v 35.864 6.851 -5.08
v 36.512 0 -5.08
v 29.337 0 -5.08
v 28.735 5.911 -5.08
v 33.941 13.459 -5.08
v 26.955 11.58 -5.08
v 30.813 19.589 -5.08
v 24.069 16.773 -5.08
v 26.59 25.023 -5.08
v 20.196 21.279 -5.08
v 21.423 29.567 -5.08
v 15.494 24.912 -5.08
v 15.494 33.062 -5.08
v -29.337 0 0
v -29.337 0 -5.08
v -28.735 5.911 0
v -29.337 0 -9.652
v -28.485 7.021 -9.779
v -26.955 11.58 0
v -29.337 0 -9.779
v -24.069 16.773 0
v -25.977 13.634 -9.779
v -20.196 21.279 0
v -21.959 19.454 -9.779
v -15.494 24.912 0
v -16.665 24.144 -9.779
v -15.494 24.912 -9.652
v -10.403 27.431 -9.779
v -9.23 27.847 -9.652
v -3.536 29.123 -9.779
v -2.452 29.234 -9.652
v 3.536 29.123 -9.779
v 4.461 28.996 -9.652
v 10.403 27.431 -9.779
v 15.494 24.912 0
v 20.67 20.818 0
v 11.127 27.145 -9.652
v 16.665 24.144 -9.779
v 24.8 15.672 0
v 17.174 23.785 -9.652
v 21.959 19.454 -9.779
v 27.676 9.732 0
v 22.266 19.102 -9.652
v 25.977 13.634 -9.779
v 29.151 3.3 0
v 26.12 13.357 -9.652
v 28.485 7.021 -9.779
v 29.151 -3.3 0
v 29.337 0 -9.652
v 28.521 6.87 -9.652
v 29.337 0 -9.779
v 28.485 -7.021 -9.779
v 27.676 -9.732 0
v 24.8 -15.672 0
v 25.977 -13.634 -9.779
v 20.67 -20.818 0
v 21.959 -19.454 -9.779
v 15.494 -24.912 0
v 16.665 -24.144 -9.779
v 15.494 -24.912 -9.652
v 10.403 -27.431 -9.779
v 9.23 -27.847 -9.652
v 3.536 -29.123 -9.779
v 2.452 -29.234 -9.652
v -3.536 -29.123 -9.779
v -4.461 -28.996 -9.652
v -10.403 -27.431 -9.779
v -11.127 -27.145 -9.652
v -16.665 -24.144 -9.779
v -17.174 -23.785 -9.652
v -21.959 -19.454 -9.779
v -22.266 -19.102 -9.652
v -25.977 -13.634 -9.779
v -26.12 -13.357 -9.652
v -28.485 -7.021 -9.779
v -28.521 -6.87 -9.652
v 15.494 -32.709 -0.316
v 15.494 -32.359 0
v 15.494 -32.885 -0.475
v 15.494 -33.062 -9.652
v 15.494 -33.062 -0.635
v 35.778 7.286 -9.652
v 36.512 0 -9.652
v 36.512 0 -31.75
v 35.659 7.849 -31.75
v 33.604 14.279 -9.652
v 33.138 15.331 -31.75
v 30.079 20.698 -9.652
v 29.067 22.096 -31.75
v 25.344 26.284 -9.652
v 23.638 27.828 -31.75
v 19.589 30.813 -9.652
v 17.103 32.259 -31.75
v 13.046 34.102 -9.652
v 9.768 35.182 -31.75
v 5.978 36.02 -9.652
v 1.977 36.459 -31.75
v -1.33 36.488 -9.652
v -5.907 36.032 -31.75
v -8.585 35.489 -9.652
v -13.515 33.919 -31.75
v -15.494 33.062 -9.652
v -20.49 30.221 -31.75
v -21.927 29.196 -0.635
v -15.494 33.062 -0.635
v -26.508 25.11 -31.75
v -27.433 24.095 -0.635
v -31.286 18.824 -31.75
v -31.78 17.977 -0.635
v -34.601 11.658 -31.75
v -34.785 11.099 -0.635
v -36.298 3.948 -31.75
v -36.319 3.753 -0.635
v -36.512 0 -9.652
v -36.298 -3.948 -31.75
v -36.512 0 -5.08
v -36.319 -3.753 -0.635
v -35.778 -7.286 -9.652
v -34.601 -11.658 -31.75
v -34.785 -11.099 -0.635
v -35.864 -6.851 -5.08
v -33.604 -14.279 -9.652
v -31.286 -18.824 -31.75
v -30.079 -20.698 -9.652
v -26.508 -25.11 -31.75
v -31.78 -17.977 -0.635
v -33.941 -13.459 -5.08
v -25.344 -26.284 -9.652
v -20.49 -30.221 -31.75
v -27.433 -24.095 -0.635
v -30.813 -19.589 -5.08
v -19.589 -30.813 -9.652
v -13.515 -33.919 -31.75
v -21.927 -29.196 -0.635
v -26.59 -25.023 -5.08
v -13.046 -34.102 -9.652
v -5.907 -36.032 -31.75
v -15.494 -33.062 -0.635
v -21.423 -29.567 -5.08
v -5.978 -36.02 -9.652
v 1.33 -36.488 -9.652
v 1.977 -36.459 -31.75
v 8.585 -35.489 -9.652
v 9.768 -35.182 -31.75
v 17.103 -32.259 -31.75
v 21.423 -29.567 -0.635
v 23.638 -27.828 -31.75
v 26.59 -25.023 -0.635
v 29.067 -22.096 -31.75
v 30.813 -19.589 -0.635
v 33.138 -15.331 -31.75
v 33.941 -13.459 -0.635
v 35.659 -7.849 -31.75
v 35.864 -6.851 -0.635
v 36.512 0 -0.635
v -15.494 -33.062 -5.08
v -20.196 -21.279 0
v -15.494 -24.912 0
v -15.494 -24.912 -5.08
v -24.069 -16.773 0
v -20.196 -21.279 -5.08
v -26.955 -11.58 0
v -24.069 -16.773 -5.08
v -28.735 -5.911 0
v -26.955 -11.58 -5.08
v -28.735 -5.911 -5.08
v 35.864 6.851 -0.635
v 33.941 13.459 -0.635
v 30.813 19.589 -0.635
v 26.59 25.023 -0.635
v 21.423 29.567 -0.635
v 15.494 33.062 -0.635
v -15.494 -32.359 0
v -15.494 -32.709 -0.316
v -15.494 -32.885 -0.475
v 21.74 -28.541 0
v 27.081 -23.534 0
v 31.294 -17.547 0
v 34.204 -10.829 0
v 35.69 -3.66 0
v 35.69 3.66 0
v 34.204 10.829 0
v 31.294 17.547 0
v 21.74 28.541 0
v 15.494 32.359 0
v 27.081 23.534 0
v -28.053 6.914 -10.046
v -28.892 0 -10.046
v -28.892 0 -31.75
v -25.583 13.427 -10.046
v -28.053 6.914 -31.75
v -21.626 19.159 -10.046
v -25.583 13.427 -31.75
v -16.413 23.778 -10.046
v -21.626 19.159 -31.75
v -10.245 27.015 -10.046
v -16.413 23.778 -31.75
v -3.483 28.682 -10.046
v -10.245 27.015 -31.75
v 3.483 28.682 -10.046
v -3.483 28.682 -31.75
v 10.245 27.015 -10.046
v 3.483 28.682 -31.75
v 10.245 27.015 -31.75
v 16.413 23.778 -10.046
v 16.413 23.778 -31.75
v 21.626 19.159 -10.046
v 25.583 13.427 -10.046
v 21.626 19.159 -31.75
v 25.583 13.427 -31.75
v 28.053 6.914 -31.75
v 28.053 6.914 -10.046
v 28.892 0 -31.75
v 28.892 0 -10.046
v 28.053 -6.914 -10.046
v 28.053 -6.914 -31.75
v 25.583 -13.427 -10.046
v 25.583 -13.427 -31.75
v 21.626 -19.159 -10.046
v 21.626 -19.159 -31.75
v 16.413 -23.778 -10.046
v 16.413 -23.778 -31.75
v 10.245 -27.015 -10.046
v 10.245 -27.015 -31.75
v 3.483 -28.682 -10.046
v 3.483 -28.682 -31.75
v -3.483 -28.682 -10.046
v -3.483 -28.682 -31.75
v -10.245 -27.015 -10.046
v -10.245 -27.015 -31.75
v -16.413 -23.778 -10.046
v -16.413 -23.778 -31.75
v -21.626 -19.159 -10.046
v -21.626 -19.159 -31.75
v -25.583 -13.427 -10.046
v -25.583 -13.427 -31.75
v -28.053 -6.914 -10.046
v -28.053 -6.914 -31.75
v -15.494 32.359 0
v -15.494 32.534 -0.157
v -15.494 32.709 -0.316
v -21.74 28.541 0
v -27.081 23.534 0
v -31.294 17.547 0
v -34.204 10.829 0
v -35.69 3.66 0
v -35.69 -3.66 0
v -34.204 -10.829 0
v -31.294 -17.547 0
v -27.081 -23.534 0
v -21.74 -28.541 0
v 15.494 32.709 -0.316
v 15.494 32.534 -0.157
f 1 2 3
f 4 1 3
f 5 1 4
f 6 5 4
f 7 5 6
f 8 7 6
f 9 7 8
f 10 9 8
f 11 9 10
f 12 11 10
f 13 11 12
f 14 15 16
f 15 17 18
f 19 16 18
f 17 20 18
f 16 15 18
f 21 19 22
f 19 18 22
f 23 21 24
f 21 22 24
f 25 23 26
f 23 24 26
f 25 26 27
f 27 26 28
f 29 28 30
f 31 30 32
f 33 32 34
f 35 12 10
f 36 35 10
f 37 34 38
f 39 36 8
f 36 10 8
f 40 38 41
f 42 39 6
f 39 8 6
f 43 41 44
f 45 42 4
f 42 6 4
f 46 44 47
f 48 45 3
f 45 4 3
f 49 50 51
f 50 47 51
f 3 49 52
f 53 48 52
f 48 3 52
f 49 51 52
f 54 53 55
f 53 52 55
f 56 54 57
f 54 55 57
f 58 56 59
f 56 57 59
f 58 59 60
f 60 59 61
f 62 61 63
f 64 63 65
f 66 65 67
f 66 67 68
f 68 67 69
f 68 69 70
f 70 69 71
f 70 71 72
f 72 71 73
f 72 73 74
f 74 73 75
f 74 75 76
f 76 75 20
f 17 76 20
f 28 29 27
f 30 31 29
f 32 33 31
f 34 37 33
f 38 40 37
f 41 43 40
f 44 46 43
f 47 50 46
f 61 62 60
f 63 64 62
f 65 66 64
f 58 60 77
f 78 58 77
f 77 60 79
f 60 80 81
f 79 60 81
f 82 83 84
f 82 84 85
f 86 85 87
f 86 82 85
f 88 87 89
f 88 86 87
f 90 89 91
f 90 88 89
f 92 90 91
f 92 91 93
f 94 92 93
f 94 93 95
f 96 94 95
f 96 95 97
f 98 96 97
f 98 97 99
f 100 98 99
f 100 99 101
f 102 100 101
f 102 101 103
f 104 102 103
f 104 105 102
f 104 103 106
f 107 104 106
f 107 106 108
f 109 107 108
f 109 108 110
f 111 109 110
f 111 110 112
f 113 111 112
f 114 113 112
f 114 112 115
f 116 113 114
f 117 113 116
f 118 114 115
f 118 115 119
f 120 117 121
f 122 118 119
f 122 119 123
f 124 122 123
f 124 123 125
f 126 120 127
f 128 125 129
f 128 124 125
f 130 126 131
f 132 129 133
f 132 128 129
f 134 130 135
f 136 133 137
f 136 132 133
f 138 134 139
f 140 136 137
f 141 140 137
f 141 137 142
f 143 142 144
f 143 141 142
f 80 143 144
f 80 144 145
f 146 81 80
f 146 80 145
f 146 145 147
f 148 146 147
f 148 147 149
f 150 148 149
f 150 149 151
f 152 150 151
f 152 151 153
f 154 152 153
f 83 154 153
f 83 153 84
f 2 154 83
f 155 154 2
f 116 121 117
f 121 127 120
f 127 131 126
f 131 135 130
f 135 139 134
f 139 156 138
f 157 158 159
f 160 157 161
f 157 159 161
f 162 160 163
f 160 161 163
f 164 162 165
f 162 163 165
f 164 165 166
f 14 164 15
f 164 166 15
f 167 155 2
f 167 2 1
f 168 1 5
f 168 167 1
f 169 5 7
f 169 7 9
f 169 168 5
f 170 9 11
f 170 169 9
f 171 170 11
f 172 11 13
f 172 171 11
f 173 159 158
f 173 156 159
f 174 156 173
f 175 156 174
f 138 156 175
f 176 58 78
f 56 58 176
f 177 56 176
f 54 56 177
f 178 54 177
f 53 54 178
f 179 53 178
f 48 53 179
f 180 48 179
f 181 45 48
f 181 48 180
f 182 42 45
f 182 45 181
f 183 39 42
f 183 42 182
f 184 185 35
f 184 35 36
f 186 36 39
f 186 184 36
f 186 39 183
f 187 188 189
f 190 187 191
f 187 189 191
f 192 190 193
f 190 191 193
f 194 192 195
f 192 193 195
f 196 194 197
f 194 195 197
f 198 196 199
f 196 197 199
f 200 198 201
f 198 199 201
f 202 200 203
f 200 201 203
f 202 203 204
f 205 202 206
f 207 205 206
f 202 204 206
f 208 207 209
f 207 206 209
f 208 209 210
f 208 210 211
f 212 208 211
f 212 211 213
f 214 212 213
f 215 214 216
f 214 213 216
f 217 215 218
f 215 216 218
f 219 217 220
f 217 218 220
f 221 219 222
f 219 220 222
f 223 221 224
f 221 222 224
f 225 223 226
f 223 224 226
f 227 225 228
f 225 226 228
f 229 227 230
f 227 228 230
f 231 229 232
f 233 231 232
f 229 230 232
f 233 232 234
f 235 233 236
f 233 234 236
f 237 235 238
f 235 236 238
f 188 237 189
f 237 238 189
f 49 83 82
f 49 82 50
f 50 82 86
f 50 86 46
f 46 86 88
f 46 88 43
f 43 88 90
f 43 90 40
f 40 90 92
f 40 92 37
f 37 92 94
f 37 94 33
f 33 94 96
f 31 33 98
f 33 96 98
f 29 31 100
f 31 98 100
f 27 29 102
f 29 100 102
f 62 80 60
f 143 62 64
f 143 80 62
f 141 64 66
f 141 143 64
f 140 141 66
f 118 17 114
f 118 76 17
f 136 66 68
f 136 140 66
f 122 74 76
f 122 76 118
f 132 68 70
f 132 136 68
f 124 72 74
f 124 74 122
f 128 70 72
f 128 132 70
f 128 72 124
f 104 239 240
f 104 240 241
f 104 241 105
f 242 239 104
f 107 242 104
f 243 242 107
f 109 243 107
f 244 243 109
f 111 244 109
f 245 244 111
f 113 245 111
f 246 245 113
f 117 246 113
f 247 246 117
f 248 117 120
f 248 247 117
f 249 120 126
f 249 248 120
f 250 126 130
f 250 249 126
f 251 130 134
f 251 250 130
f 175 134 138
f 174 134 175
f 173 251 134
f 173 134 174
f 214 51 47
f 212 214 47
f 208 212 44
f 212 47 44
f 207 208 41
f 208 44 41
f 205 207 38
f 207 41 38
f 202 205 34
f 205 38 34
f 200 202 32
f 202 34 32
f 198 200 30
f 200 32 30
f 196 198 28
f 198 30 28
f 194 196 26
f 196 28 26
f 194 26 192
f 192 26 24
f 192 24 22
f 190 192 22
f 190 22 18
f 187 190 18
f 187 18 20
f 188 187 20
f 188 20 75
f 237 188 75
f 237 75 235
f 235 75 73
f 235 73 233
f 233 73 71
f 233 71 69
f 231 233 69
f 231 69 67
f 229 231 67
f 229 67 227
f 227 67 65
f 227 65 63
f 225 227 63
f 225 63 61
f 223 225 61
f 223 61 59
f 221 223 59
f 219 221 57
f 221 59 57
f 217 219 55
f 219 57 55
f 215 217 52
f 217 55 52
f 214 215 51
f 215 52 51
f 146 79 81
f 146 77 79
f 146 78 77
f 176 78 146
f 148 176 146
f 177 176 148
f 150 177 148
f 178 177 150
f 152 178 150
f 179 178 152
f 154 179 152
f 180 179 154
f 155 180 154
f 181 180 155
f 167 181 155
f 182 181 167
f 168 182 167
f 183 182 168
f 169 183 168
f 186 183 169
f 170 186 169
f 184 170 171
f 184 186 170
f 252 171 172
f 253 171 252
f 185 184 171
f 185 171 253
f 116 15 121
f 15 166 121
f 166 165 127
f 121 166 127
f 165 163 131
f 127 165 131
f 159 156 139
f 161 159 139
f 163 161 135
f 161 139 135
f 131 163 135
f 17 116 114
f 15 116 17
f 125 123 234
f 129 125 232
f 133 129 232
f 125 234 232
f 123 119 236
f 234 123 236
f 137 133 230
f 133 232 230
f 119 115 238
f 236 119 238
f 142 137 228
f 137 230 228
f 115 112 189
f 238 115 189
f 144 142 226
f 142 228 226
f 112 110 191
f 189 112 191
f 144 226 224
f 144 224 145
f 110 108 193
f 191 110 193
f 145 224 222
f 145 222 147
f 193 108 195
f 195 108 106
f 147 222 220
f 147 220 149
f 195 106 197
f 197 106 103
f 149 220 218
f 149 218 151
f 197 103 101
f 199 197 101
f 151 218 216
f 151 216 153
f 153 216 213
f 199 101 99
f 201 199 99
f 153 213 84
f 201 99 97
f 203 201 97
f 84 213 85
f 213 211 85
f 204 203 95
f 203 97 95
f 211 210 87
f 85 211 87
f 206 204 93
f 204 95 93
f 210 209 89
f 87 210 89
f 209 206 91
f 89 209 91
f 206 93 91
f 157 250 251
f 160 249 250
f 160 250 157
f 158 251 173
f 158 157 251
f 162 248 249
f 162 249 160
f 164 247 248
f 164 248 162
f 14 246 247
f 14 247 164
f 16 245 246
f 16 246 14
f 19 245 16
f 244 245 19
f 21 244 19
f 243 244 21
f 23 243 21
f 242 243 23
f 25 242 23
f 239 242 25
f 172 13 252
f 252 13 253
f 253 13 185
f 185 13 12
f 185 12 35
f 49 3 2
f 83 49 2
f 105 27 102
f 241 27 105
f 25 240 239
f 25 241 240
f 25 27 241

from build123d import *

# Parameters (mm, degrees)
F0_R      = 36.5125
F1_DEPTH  = 31.75
F2_D      = 57.785
F3_D      = 58.674
F3_DEPTH  = 9.779
F3_TIP    = 17.6274479804
F4_SIZE   = 0.635
F7_W      = 19.3039988202
F7_H      = 4.572
F8_ANGLE  = 90
F9_W      = 30.988
F9_H      = 9.652
F10_DEPTH = 50.8


with BuildPart() as f1:
    # F0 (on Top) → F1 (new body)
    with BuildSketch(Plane.XY):
        Circle(F0_R)
    extrude(amount=-F1_DEPTH)

    # F2 (through all)
    with Locations(Plane.XY):
        with Locations((0, 0)):
            Hole(F2_D / 2)

    # F3
    with Locations(Plane.XY):
        with Locations((0, 0)):
            Hole(F3_D / 2, depth=F3_DEPTH)
            with Locations((0, 0, -(F3_DEPTH + F3_TIP / 2))):  # 118° drill point
                Cone(0, F3_D / 2, F3_TIP, mode=Mode.SUBTRACT)

    # F4
    f4_edges = [f1.edges().sort_by_distance(p)[0] for p in [
        (-36.5125, 0, 0),
    ]]
    chamfer(f4_edges, length=F4_SIZE)

    # F7 (on Front) → F8 (revolve, cut)
    with BuildSketch(Plane.XZ):
        with Locations((-33.327289857, -7.366)):
            Rectangle(F7_W, F7_H)
        with Locations((33.327289857, -7.366)):
            Rectangle(F7_W, F7_H)
    revolve(axis=Axis((0, 0, -17.7771920571), (0, 0, 1)), revolution_arc=F8_ANGLE, mode=Mode.SUBTRACT)

    # F9 (on Front) → F10 (cut, symmetric)
    with BuildSketch(Plane.XZ):
        with Locations((0, -4.826)):
            Rectangle(F9_W, F9_H)
    extrude(amount=F10_DEPTH, both=True, mode=Mode.SUBTRACT)


solid = f1.part
